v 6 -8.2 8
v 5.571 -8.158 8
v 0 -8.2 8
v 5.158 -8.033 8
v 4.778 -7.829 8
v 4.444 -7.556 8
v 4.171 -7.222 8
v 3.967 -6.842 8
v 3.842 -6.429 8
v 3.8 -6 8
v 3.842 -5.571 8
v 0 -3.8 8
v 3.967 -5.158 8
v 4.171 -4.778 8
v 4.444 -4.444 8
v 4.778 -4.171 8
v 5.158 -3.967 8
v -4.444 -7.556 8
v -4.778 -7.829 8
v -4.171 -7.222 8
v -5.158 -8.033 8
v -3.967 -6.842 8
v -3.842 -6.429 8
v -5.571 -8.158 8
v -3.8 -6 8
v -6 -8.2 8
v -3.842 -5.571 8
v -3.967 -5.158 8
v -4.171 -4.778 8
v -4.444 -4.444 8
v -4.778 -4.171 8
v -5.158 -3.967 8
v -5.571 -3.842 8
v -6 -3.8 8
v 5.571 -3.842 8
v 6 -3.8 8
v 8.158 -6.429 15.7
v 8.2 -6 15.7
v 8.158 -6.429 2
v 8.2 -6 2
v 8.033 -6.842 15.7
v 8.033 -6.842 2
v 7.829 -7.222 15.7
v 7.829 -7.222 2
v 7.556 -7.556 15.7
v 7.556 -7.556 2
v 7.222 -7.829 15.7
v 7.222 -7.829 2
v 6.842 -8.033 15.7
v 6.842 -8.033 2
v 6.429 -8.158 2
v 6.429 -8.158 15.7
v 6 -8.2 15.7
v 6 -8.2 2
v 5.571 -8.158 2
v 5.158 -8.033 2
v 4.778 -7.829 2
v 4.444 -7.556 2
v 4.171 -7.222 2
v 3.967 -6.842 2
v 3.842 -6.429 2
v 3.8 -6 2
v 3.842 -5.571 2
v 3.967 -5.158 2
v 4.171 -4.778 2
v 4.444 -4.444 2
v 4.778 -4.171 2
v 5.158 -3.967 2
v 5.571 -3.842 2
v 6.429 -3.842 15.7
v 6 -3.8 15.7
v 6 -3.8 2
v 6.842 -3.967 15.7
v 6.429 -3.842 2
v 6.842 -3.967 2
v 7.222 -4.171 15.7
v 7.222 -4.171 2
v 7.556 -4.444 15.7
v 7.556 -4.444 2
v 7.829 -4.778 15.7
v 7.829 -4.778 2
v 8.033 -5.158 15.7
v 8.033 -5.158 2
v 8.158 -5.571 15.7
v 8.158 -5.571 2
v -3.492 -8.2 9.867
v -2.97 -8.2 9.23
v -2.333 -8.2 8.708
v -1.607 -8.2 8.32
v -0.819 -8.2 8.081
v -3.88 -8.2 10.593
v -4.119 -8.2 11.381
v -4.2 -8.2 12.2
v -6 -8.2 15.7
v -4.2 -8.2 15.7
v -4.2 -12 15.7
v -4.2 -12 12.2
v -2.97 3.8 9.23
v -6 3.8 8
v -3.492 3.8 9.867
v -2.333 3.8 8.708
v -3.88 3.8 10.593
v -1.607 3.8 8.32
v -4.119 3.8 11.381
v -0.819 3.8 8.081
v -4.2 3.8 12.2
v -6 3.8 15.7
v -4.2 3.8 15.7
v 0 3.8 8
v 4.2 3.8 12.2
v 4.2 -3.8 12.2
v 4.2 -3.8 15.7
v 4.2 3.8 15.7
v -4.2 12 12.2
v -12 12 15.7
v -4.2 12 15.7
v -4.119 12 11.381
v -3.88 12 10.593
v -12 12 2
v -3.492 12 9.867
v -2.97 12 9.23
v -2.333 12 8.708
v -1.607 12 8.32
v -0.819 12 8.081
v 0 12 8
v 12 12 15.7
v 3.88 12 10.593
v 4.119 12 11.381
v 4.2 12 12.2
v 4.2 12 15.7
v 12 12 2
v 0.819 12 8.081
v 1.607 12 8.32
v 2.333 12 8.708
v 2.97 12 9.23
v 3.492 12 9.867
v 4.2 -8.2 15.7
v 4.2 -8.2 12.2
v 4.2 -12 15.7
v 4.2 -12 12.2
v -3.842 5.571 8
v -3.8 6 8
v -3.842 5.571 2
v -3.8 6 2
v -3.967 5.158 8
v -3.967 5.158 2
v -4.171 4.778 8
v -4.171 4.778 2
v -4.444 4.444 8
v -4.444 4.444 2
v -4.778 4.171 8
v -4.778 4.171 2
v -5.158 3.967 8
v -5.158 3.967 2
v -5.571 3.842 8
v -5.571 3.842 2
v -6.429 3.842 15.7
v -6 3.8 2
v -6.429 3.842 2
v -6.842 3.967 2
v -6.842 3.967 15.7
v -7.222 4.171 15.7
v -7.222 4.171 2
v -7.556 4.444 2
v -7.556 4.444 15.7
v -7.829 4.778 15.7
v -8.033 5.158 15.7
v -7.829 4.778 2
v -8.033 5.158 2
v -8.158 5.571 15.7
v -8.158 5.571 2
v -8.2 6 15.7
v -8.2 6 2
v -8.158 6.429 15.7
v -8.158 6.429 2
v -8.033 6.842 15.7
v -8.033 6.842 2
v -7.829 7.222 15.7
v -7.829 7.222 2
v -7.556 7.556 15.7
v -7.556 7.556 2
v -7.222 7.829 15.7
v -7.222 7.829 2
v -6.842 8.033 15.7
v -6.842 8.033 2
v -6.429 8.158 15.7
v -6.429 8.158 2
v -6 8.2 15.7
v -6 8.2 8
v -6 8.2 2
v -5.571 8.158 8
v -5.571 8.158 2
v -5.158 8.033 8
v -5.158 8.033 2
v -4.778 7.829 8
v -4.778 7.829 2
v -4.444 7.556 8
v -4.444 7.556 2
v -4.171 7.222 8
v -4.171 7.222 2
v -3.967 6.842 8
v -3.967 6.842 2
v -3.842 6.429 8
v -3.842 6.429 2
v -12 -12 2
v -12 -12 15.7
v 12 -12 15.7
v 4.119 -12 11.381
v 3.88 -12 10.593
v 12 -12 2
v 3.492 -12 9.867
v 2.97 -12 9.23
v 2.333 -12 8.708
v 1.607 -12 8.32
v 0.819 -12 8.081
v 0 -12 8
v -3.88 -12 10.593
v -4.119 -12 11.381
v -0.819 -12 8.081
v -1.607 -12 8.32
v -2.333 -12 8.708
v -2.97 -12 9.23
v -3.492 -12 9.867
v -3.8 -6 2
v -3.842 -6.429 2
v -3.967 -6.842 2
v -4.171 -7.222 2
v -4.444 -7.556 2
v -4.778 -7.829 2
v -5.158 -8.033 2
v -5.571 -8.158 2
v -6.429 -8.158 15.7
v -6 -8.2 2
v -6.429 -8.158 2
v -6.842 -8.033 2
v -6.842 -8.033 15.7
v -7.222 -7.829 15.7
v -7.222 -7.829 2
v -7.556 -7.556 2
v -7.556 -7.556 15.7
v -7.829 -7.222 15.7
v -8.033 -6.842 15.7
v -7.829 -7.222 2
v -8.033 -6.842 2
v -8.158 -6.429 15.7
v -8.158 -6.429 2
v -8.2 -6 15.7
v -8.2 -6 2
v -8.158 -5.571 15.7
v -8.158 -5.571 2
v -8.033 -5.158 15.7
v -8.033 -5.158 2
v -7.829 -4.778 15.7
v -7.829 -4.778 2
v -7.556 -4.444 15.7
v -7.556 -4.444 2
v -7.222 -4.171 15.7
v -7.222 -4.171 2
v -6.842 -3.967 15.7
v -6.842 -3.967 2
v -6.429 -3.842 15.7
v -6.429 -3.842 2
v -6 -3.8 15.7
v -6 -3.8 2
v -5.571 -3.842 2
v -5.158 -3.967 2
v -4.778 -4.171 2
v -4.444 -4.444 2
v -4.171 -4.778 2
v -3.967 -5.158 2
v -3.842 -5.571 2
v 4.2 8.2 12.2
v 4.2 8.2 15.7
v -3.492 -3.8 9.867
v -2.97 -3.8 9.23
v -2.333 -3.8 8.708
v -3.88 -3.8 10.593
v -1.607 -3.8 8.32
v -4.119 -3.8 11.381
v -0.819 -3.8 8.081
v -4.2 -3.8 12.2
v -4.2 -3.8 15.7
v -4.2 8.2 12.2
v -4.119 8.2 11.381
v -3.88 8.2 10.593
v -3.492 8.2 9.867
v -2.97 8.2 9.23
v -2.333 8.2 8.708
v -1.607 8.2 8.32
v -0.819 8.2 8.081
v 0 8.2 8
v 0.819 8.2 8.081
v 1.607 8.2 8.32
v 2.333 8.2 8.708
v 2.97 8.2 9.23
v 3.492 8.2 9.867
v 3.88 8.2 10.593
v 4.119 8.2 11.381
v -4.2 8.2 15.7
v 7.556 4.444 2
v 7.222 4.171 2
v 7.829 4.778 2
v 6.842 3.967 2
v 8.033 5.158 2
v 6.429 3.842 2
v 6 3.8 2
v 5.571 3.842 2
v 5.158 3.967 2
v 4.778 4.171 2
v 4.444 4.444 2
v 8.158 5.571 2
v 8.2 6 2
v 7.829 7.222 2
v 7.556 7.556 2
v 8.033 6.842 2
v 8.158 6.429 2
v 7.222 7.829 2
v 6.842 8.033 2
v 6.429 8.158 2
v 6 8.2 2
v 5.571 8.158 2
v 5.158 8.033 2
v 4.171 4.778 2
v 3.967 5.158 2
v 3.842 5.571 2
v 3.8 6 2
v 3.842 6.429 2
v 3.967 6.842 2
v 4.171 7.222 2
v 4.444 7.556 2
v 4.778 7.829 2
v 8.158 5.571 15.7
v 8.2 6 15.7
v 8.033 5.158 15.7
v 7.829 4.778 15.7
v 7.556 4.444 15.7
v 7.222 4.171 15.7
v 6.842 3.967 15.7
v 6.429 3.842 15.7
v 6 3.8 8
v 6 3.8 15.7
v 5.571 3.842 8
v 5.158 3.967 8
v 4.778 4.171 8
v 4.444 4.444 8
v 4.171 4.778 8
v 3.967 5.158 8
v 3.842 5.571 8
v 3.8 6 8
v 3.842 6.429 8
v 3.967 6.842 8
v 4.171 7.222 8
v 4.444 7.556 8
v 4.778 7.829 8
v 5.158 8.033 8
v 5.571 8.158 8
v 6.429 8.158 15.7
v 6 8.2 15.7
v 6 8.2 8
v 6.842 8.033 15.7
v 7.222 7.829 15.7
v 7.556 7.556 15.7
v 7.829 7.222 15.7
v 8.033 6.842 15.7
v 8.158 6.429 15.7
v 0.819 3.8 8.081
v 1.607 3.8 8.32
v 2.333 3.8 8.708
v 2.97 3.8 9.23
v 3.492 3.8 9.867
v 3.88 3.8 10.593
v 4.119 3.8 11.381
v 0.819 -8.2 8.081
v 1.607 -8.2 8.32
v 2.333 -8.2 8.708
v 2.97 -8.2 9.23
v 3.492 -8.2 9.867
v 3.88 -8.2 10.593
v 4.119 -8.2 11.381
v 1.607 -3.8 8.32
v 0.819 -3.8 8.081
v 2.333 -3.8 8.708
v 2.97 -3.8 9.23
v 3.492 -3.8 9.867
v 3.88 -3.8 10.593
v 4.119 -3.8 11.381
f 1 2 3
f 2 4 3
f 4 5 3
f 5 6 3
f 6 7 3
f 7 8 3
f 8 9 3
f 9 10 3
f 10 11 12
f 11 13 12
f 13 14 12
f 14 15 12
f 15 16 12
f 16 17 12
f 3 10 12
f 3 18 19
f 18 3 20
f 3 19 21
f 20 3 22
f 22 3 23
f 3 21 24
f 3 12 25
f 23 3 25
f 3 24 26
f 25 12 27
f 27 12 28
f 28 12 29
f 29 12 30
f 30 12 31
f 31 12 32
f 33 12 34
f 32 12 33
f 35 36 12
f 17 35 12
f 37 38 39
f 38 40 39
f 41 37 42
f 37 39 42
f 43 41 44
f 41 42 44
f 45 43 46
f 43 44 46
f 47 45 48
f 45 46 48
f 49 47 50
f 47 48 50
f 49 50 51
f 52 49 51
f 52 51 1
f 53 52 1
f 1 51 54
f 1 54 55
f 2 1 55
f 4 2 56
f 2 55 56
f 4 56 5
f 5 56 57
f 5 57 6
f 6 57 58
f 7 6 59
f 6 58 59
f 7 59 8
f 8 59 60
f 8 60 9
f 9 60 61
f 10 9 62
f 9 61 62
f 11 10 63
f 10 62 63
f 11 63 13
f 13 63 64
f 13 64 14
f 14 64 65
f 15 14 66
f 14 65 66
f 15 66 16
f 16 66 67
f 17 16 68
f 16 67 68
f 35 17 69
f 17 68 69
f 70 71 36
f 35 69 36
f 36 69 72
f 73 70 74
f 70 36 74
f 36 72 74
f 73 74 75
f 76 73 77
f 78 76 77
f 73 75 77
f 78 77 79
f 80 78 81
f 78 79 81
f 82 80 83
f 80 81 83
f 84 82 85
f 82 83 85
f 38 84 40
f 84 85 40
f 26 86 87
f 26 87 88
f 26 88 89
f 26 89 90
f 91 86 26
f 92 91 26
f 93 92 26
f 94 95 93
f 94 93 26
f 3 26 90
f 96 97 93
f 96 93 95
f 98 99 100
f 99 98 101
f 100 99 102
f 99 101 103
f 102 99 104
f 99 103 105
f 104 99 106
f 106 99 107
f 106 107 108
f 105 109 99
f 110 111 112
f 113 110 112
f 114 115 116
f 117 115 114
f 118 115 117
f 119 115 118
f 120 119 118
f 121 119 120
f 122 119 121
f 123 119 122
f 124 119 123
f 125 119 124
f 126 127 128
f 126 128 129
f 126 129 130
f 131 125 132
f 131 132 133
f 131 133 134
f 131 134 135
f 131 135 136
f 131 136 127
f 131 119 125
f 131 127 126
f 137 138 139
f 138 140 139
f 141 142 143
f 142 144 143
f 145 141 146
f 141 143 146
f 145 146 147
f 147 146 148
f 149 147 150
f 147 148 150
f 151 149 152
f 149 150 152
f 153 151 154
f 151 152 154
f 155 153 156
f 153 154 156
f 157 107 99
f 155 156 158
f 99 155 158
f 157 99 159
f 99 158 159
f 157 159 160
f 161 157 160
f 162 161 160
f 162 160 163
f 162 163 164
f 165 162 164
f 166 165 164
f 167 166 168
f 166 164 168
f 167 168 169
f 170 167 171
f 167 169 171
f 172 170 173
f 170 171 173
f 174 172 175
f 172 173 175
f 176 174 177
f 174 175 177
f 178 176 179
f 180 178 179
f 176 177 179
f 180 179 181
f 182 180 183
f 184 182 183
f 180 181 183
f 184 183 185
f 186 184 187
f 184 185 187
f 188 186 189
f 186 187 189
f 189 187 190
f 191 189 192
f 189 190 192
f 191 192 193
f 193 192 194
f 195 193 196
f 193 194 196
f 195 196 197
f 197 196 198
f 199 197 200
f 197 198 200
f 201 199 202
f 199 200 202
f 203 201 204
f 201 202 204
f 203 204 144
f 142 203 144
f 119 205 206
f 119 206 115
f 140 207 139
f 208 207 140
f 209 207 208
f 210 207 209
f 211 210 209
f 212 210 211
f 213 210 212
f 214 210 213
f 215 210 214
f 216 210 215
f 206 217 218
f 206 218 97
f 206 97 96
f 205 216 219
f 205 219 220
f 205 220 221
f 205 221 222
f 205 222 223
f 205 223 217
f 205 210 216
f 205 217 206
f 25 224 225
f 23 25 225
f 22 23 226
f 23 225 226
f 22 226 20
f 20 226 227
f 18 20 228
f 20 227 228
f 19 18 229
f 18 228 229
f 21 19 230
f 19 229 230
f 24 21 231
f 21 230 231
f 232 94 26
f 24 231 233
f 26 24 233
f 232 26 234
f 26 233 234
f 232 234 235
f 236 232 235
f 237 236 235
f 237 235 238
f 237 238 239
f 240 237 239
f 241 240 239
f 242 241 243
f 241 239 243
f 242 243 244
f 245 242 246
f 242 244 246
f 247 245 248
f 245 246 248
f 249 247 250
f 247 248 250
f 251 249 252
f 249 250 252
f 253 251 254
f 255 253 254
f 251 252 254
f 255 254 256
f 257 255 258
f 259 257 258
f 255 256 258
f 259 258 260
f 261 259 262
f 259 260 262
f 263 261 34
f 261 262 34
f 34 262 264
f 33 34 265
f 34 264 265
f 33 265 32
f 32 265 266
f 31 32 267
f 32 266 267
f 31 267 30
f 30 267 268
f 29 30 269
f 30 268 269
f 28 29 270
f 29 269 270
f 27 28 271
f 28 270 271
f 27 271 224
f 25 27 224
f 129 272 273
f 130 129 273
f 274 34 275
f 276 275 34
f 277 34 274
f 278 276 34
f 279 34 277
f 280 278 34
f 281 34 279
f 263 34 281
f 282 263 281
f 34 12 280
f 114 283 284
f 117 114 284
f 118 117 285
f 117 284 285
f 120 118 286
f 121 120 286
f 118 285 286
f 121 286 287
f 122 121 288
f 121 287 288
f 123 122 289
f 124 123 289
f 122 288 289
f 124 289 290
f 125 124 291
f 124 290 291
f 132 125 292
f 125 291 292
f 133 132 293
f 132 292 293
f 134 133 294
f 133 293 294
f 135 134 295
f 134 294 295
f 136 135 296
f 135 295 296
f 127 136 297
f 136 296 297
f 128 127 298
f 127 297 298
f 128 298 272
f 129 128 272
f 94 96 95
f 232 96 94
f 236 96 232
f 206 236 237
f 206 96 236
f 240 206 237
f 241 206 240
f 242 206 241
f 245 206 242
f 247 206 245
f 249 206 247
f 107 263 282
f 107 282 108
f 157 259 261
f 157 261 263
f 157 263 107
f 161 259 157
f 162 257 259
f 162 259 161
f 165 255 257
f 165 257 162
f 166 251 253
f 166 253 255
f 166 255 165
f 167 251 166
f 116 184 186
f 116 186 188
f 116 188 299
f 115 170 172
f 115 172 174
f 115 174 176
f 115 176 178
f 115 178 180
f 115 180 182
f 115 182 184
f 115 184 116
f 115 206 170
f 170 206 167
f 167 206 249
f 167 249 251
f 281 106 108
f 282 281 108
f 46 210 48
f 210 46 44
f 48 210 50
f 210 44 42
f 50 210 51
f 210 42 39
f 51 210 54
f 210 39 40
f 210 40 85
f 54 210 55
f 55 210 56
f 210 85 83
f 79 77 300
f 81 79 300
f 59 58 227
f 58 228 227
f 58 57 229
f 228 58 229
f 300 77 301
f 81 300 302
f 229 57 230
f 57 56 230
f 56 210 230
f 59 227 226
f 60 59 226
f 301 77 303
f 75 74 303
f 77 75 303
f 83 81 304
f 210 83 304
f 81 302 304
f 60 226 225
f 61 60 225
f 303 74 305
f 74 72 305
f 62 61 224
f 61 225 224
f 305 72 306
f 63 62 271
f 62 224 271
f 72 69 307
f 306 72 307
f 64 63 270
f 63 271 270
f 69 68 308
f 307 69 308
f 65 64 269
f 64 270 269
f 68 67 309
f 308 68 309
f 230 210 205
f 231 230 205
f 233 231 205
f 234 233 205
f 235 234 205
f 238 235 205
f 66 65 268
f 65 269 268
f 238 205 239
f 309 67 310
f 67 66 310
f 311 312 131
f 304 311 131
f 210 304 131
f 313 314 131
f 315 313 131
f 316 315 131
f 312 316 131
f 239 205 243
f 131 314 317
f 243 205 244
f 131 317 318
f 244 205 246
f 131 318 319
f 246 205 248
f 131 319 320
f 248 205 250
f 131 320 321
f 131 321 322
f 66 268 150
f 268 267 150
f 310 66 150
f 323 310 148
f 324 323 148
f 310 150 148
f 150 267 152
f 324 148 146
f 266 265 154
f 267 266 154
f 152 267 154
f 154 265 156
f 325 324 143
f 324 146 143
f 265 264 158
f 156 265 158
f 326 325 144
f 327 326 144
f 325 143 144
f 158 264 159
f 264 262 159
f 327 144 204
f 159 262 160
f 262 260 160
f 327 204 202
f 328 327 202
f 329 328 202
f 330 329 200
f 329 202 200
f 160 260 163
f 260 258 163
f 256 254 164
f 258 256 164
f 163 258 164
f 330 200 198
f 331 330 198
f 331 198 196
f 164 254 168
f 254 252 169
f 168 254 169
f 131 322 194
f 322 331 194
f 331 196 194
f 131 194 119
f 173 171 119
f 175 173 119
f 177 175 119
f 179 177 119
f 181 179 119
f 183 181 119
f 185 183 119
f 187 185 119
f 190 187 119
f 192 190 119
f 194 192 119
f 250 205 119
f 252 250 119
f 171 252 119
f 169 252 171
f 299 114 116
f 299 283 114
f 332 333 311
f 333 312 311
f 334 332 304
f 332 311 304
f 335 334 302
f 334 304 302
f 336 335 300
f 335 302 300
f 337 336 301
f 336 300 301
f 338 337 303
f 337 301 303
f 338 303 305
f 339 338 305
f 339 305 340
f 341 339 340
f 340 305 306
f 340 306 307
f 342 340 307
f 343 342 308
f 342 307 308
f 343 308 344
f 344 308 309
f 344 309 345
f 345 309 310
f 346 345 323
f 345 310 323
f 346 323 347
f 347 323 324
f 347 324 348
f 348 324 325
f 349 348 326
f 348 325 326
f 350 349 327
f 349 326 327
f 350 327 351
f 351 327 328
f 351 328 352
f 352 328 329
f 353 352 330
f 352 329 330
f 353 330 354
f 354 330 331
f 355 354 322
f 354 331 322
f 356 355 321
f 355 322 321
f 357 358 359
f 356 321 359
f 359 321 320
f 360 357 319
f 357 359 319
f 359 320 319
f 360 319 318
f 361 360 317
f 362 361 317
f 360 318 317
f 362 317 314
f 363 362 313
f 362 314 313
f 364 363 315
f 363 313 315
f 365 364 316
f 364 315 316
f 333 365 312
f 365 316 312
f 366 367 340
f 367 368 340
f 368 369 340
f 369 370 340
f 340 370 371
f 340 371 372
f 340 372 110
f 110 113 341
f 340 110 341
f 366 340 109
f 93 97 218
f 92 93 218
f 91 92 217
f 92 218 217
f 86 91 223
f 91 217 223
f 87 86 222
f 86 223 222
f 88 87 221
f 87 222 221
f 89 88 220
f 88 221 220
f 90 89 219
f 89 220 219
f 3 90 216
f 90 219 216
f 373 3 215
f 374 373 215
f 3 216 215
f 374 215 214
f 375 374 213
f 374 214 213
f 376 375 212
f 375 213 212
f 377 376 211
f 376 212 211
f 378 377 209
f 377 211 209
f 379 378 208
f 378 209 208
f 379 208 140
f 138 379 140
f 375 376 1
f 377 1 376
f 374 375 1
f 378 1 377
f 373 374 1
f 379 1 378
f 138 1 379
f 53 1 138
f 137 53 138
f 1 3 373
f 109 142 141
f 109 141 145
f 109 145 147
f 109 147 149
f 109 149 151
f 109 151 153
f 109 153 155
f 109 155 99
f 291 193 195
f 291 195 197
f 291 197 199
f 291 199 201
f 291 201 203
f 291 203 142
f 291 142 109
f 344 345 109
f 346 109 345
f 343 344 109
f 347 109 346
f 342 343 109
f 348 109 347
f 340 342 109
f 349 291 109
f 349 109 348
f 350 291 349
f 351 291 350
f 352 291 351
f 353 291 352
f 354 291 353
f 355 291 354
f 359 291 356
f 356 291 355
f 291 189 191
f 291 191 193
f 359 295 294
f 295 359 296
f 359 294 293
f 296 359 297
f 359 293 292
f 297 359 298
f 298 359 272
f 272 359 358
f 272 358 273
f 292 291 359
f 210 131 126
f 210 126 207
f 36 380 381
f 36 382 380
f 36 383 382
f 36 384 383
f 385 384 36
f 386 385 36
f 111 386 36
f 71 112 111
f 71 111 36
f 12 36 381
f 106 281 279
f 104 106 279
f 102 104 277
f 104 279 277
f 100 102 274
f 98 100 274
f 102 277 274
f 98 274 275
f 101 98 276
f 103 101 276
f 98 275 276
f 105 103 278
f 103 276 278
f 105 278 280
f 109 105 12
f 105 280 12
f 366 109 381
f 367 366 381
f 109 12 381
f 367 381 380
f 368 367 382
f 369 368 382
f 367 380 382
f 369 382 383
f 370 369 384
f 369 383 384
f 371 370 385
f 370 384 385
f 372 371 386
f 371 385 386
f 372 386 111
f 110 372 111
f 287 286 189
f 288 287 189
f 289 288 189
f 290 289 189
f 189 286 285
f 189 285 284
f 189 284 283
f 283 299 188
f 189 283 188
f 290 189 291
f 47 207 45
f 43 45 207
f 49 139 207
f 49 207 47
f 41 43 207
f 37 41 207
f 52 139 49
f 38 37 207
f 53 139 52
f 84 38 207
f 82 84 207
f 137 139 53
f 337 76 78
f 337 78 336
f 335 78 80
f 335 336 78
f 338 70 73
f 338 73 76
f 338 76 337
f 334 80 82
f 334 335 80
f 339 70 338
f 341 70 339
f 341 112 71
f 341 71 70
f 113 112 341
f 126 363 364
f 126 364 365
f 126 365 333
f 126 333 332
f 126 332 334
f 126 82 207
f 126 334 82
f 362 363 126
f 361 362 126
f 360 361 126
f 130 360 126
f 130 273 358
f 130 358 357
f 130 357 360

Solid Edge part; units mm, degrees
sketch "Sketch1" plane through (0, 0, 0) normal (0, 0, 1) x (1, 0, 0)
  circle A0 centre (6, 6) radius 2.2
  circle A1 centre (-6, -6) radius 2.2
  circle A2 centre (6, -6) radius 2.2
  line L0 (-12, 12) -> (12, 12)
  line L1 (12, 12) -> (12, -12)
  line L2 (12, -12) -> (-12, -12)
  line L3 (-12, -12) -> (-12, 12)
  circle A3 centre (-6, 6) radius 2.2
  dimension "D1" = 9
  dimension "D2" = 24
  dimension "D3" = 24
  dimension "D4" = 4.4
  dimension "D5" = 6
  dimension "D6" = 6
extrude "Protrusion1" add sketch "Sketch1" along normal blind 16
sketch "Sketch2" plane through (0, -12, 8) normal (0, -1, 0) x (1, 0, 0)
  line L0 (-4.2, 4.2) -> (-4.2, 14.9172)
  line L1 (4.2, 4.2) -> (4.2, 14.9172)
  arc A0 (4.2, 4.2) -> (-4.2, 4.2) centre (0, 4.2) cw
extrude "Cutout1" cut sketch "Sketch2" against normal through all material side at (-4.15, -12, 17.5586)
sketch "Sketch3" plane through (-12, -6.7, 8) normal (-1, 0, 0) x (0, -1, 0)
  line L0 (4, 7.7) -> (-4, 7.7)
  dimension "D1" = 0.3
extrude "Cutout2" cut sketch "Sketch3" against normal through all material side at (-12, -6.7, 15.75)
sketch "Sketch4" plane through (-12, -6.7, 7.85) normal (-1, 0, 0) x (0, -1, 0)
  line L0 (53.3, -5.85) -> (-66.7, -5.85)
  dimension "D1" = 2
extrude "Cutout3" cut sketch "Sketch4" against normal through all material side at (-12, 0, 1.95)
sketch "Sketch5" plane through (-8.1, 0, 15.7) normal (0, 0, 1) x (1, 0, 0)
  line L0 (2.1, 3.8) -> (14.1, 3.8)
  line L1 (14.1, 3.8) -> (14.1, 8.2)
  line L2 (14.1, 8.2) -> (2.1, 8.2)
  line L3 (2.1, 8.2) -> (2.1, 3.8)
  line L4 (2.1, -3.8) -> (14.1, -3.8)
  line L5 (14.1, -3.8) -> (14.1, -8.2)
  line L6 (14.1, -8.2) -> (2.1, -8.2)
  line L7 (2.1, -8.2) -> (2.1, -3.8)
extrude "Cutout4" cut sketch "Sketch5" against normal up to vertex (7.7 mm away)
properties material "ABS Plastic, medium impact"
